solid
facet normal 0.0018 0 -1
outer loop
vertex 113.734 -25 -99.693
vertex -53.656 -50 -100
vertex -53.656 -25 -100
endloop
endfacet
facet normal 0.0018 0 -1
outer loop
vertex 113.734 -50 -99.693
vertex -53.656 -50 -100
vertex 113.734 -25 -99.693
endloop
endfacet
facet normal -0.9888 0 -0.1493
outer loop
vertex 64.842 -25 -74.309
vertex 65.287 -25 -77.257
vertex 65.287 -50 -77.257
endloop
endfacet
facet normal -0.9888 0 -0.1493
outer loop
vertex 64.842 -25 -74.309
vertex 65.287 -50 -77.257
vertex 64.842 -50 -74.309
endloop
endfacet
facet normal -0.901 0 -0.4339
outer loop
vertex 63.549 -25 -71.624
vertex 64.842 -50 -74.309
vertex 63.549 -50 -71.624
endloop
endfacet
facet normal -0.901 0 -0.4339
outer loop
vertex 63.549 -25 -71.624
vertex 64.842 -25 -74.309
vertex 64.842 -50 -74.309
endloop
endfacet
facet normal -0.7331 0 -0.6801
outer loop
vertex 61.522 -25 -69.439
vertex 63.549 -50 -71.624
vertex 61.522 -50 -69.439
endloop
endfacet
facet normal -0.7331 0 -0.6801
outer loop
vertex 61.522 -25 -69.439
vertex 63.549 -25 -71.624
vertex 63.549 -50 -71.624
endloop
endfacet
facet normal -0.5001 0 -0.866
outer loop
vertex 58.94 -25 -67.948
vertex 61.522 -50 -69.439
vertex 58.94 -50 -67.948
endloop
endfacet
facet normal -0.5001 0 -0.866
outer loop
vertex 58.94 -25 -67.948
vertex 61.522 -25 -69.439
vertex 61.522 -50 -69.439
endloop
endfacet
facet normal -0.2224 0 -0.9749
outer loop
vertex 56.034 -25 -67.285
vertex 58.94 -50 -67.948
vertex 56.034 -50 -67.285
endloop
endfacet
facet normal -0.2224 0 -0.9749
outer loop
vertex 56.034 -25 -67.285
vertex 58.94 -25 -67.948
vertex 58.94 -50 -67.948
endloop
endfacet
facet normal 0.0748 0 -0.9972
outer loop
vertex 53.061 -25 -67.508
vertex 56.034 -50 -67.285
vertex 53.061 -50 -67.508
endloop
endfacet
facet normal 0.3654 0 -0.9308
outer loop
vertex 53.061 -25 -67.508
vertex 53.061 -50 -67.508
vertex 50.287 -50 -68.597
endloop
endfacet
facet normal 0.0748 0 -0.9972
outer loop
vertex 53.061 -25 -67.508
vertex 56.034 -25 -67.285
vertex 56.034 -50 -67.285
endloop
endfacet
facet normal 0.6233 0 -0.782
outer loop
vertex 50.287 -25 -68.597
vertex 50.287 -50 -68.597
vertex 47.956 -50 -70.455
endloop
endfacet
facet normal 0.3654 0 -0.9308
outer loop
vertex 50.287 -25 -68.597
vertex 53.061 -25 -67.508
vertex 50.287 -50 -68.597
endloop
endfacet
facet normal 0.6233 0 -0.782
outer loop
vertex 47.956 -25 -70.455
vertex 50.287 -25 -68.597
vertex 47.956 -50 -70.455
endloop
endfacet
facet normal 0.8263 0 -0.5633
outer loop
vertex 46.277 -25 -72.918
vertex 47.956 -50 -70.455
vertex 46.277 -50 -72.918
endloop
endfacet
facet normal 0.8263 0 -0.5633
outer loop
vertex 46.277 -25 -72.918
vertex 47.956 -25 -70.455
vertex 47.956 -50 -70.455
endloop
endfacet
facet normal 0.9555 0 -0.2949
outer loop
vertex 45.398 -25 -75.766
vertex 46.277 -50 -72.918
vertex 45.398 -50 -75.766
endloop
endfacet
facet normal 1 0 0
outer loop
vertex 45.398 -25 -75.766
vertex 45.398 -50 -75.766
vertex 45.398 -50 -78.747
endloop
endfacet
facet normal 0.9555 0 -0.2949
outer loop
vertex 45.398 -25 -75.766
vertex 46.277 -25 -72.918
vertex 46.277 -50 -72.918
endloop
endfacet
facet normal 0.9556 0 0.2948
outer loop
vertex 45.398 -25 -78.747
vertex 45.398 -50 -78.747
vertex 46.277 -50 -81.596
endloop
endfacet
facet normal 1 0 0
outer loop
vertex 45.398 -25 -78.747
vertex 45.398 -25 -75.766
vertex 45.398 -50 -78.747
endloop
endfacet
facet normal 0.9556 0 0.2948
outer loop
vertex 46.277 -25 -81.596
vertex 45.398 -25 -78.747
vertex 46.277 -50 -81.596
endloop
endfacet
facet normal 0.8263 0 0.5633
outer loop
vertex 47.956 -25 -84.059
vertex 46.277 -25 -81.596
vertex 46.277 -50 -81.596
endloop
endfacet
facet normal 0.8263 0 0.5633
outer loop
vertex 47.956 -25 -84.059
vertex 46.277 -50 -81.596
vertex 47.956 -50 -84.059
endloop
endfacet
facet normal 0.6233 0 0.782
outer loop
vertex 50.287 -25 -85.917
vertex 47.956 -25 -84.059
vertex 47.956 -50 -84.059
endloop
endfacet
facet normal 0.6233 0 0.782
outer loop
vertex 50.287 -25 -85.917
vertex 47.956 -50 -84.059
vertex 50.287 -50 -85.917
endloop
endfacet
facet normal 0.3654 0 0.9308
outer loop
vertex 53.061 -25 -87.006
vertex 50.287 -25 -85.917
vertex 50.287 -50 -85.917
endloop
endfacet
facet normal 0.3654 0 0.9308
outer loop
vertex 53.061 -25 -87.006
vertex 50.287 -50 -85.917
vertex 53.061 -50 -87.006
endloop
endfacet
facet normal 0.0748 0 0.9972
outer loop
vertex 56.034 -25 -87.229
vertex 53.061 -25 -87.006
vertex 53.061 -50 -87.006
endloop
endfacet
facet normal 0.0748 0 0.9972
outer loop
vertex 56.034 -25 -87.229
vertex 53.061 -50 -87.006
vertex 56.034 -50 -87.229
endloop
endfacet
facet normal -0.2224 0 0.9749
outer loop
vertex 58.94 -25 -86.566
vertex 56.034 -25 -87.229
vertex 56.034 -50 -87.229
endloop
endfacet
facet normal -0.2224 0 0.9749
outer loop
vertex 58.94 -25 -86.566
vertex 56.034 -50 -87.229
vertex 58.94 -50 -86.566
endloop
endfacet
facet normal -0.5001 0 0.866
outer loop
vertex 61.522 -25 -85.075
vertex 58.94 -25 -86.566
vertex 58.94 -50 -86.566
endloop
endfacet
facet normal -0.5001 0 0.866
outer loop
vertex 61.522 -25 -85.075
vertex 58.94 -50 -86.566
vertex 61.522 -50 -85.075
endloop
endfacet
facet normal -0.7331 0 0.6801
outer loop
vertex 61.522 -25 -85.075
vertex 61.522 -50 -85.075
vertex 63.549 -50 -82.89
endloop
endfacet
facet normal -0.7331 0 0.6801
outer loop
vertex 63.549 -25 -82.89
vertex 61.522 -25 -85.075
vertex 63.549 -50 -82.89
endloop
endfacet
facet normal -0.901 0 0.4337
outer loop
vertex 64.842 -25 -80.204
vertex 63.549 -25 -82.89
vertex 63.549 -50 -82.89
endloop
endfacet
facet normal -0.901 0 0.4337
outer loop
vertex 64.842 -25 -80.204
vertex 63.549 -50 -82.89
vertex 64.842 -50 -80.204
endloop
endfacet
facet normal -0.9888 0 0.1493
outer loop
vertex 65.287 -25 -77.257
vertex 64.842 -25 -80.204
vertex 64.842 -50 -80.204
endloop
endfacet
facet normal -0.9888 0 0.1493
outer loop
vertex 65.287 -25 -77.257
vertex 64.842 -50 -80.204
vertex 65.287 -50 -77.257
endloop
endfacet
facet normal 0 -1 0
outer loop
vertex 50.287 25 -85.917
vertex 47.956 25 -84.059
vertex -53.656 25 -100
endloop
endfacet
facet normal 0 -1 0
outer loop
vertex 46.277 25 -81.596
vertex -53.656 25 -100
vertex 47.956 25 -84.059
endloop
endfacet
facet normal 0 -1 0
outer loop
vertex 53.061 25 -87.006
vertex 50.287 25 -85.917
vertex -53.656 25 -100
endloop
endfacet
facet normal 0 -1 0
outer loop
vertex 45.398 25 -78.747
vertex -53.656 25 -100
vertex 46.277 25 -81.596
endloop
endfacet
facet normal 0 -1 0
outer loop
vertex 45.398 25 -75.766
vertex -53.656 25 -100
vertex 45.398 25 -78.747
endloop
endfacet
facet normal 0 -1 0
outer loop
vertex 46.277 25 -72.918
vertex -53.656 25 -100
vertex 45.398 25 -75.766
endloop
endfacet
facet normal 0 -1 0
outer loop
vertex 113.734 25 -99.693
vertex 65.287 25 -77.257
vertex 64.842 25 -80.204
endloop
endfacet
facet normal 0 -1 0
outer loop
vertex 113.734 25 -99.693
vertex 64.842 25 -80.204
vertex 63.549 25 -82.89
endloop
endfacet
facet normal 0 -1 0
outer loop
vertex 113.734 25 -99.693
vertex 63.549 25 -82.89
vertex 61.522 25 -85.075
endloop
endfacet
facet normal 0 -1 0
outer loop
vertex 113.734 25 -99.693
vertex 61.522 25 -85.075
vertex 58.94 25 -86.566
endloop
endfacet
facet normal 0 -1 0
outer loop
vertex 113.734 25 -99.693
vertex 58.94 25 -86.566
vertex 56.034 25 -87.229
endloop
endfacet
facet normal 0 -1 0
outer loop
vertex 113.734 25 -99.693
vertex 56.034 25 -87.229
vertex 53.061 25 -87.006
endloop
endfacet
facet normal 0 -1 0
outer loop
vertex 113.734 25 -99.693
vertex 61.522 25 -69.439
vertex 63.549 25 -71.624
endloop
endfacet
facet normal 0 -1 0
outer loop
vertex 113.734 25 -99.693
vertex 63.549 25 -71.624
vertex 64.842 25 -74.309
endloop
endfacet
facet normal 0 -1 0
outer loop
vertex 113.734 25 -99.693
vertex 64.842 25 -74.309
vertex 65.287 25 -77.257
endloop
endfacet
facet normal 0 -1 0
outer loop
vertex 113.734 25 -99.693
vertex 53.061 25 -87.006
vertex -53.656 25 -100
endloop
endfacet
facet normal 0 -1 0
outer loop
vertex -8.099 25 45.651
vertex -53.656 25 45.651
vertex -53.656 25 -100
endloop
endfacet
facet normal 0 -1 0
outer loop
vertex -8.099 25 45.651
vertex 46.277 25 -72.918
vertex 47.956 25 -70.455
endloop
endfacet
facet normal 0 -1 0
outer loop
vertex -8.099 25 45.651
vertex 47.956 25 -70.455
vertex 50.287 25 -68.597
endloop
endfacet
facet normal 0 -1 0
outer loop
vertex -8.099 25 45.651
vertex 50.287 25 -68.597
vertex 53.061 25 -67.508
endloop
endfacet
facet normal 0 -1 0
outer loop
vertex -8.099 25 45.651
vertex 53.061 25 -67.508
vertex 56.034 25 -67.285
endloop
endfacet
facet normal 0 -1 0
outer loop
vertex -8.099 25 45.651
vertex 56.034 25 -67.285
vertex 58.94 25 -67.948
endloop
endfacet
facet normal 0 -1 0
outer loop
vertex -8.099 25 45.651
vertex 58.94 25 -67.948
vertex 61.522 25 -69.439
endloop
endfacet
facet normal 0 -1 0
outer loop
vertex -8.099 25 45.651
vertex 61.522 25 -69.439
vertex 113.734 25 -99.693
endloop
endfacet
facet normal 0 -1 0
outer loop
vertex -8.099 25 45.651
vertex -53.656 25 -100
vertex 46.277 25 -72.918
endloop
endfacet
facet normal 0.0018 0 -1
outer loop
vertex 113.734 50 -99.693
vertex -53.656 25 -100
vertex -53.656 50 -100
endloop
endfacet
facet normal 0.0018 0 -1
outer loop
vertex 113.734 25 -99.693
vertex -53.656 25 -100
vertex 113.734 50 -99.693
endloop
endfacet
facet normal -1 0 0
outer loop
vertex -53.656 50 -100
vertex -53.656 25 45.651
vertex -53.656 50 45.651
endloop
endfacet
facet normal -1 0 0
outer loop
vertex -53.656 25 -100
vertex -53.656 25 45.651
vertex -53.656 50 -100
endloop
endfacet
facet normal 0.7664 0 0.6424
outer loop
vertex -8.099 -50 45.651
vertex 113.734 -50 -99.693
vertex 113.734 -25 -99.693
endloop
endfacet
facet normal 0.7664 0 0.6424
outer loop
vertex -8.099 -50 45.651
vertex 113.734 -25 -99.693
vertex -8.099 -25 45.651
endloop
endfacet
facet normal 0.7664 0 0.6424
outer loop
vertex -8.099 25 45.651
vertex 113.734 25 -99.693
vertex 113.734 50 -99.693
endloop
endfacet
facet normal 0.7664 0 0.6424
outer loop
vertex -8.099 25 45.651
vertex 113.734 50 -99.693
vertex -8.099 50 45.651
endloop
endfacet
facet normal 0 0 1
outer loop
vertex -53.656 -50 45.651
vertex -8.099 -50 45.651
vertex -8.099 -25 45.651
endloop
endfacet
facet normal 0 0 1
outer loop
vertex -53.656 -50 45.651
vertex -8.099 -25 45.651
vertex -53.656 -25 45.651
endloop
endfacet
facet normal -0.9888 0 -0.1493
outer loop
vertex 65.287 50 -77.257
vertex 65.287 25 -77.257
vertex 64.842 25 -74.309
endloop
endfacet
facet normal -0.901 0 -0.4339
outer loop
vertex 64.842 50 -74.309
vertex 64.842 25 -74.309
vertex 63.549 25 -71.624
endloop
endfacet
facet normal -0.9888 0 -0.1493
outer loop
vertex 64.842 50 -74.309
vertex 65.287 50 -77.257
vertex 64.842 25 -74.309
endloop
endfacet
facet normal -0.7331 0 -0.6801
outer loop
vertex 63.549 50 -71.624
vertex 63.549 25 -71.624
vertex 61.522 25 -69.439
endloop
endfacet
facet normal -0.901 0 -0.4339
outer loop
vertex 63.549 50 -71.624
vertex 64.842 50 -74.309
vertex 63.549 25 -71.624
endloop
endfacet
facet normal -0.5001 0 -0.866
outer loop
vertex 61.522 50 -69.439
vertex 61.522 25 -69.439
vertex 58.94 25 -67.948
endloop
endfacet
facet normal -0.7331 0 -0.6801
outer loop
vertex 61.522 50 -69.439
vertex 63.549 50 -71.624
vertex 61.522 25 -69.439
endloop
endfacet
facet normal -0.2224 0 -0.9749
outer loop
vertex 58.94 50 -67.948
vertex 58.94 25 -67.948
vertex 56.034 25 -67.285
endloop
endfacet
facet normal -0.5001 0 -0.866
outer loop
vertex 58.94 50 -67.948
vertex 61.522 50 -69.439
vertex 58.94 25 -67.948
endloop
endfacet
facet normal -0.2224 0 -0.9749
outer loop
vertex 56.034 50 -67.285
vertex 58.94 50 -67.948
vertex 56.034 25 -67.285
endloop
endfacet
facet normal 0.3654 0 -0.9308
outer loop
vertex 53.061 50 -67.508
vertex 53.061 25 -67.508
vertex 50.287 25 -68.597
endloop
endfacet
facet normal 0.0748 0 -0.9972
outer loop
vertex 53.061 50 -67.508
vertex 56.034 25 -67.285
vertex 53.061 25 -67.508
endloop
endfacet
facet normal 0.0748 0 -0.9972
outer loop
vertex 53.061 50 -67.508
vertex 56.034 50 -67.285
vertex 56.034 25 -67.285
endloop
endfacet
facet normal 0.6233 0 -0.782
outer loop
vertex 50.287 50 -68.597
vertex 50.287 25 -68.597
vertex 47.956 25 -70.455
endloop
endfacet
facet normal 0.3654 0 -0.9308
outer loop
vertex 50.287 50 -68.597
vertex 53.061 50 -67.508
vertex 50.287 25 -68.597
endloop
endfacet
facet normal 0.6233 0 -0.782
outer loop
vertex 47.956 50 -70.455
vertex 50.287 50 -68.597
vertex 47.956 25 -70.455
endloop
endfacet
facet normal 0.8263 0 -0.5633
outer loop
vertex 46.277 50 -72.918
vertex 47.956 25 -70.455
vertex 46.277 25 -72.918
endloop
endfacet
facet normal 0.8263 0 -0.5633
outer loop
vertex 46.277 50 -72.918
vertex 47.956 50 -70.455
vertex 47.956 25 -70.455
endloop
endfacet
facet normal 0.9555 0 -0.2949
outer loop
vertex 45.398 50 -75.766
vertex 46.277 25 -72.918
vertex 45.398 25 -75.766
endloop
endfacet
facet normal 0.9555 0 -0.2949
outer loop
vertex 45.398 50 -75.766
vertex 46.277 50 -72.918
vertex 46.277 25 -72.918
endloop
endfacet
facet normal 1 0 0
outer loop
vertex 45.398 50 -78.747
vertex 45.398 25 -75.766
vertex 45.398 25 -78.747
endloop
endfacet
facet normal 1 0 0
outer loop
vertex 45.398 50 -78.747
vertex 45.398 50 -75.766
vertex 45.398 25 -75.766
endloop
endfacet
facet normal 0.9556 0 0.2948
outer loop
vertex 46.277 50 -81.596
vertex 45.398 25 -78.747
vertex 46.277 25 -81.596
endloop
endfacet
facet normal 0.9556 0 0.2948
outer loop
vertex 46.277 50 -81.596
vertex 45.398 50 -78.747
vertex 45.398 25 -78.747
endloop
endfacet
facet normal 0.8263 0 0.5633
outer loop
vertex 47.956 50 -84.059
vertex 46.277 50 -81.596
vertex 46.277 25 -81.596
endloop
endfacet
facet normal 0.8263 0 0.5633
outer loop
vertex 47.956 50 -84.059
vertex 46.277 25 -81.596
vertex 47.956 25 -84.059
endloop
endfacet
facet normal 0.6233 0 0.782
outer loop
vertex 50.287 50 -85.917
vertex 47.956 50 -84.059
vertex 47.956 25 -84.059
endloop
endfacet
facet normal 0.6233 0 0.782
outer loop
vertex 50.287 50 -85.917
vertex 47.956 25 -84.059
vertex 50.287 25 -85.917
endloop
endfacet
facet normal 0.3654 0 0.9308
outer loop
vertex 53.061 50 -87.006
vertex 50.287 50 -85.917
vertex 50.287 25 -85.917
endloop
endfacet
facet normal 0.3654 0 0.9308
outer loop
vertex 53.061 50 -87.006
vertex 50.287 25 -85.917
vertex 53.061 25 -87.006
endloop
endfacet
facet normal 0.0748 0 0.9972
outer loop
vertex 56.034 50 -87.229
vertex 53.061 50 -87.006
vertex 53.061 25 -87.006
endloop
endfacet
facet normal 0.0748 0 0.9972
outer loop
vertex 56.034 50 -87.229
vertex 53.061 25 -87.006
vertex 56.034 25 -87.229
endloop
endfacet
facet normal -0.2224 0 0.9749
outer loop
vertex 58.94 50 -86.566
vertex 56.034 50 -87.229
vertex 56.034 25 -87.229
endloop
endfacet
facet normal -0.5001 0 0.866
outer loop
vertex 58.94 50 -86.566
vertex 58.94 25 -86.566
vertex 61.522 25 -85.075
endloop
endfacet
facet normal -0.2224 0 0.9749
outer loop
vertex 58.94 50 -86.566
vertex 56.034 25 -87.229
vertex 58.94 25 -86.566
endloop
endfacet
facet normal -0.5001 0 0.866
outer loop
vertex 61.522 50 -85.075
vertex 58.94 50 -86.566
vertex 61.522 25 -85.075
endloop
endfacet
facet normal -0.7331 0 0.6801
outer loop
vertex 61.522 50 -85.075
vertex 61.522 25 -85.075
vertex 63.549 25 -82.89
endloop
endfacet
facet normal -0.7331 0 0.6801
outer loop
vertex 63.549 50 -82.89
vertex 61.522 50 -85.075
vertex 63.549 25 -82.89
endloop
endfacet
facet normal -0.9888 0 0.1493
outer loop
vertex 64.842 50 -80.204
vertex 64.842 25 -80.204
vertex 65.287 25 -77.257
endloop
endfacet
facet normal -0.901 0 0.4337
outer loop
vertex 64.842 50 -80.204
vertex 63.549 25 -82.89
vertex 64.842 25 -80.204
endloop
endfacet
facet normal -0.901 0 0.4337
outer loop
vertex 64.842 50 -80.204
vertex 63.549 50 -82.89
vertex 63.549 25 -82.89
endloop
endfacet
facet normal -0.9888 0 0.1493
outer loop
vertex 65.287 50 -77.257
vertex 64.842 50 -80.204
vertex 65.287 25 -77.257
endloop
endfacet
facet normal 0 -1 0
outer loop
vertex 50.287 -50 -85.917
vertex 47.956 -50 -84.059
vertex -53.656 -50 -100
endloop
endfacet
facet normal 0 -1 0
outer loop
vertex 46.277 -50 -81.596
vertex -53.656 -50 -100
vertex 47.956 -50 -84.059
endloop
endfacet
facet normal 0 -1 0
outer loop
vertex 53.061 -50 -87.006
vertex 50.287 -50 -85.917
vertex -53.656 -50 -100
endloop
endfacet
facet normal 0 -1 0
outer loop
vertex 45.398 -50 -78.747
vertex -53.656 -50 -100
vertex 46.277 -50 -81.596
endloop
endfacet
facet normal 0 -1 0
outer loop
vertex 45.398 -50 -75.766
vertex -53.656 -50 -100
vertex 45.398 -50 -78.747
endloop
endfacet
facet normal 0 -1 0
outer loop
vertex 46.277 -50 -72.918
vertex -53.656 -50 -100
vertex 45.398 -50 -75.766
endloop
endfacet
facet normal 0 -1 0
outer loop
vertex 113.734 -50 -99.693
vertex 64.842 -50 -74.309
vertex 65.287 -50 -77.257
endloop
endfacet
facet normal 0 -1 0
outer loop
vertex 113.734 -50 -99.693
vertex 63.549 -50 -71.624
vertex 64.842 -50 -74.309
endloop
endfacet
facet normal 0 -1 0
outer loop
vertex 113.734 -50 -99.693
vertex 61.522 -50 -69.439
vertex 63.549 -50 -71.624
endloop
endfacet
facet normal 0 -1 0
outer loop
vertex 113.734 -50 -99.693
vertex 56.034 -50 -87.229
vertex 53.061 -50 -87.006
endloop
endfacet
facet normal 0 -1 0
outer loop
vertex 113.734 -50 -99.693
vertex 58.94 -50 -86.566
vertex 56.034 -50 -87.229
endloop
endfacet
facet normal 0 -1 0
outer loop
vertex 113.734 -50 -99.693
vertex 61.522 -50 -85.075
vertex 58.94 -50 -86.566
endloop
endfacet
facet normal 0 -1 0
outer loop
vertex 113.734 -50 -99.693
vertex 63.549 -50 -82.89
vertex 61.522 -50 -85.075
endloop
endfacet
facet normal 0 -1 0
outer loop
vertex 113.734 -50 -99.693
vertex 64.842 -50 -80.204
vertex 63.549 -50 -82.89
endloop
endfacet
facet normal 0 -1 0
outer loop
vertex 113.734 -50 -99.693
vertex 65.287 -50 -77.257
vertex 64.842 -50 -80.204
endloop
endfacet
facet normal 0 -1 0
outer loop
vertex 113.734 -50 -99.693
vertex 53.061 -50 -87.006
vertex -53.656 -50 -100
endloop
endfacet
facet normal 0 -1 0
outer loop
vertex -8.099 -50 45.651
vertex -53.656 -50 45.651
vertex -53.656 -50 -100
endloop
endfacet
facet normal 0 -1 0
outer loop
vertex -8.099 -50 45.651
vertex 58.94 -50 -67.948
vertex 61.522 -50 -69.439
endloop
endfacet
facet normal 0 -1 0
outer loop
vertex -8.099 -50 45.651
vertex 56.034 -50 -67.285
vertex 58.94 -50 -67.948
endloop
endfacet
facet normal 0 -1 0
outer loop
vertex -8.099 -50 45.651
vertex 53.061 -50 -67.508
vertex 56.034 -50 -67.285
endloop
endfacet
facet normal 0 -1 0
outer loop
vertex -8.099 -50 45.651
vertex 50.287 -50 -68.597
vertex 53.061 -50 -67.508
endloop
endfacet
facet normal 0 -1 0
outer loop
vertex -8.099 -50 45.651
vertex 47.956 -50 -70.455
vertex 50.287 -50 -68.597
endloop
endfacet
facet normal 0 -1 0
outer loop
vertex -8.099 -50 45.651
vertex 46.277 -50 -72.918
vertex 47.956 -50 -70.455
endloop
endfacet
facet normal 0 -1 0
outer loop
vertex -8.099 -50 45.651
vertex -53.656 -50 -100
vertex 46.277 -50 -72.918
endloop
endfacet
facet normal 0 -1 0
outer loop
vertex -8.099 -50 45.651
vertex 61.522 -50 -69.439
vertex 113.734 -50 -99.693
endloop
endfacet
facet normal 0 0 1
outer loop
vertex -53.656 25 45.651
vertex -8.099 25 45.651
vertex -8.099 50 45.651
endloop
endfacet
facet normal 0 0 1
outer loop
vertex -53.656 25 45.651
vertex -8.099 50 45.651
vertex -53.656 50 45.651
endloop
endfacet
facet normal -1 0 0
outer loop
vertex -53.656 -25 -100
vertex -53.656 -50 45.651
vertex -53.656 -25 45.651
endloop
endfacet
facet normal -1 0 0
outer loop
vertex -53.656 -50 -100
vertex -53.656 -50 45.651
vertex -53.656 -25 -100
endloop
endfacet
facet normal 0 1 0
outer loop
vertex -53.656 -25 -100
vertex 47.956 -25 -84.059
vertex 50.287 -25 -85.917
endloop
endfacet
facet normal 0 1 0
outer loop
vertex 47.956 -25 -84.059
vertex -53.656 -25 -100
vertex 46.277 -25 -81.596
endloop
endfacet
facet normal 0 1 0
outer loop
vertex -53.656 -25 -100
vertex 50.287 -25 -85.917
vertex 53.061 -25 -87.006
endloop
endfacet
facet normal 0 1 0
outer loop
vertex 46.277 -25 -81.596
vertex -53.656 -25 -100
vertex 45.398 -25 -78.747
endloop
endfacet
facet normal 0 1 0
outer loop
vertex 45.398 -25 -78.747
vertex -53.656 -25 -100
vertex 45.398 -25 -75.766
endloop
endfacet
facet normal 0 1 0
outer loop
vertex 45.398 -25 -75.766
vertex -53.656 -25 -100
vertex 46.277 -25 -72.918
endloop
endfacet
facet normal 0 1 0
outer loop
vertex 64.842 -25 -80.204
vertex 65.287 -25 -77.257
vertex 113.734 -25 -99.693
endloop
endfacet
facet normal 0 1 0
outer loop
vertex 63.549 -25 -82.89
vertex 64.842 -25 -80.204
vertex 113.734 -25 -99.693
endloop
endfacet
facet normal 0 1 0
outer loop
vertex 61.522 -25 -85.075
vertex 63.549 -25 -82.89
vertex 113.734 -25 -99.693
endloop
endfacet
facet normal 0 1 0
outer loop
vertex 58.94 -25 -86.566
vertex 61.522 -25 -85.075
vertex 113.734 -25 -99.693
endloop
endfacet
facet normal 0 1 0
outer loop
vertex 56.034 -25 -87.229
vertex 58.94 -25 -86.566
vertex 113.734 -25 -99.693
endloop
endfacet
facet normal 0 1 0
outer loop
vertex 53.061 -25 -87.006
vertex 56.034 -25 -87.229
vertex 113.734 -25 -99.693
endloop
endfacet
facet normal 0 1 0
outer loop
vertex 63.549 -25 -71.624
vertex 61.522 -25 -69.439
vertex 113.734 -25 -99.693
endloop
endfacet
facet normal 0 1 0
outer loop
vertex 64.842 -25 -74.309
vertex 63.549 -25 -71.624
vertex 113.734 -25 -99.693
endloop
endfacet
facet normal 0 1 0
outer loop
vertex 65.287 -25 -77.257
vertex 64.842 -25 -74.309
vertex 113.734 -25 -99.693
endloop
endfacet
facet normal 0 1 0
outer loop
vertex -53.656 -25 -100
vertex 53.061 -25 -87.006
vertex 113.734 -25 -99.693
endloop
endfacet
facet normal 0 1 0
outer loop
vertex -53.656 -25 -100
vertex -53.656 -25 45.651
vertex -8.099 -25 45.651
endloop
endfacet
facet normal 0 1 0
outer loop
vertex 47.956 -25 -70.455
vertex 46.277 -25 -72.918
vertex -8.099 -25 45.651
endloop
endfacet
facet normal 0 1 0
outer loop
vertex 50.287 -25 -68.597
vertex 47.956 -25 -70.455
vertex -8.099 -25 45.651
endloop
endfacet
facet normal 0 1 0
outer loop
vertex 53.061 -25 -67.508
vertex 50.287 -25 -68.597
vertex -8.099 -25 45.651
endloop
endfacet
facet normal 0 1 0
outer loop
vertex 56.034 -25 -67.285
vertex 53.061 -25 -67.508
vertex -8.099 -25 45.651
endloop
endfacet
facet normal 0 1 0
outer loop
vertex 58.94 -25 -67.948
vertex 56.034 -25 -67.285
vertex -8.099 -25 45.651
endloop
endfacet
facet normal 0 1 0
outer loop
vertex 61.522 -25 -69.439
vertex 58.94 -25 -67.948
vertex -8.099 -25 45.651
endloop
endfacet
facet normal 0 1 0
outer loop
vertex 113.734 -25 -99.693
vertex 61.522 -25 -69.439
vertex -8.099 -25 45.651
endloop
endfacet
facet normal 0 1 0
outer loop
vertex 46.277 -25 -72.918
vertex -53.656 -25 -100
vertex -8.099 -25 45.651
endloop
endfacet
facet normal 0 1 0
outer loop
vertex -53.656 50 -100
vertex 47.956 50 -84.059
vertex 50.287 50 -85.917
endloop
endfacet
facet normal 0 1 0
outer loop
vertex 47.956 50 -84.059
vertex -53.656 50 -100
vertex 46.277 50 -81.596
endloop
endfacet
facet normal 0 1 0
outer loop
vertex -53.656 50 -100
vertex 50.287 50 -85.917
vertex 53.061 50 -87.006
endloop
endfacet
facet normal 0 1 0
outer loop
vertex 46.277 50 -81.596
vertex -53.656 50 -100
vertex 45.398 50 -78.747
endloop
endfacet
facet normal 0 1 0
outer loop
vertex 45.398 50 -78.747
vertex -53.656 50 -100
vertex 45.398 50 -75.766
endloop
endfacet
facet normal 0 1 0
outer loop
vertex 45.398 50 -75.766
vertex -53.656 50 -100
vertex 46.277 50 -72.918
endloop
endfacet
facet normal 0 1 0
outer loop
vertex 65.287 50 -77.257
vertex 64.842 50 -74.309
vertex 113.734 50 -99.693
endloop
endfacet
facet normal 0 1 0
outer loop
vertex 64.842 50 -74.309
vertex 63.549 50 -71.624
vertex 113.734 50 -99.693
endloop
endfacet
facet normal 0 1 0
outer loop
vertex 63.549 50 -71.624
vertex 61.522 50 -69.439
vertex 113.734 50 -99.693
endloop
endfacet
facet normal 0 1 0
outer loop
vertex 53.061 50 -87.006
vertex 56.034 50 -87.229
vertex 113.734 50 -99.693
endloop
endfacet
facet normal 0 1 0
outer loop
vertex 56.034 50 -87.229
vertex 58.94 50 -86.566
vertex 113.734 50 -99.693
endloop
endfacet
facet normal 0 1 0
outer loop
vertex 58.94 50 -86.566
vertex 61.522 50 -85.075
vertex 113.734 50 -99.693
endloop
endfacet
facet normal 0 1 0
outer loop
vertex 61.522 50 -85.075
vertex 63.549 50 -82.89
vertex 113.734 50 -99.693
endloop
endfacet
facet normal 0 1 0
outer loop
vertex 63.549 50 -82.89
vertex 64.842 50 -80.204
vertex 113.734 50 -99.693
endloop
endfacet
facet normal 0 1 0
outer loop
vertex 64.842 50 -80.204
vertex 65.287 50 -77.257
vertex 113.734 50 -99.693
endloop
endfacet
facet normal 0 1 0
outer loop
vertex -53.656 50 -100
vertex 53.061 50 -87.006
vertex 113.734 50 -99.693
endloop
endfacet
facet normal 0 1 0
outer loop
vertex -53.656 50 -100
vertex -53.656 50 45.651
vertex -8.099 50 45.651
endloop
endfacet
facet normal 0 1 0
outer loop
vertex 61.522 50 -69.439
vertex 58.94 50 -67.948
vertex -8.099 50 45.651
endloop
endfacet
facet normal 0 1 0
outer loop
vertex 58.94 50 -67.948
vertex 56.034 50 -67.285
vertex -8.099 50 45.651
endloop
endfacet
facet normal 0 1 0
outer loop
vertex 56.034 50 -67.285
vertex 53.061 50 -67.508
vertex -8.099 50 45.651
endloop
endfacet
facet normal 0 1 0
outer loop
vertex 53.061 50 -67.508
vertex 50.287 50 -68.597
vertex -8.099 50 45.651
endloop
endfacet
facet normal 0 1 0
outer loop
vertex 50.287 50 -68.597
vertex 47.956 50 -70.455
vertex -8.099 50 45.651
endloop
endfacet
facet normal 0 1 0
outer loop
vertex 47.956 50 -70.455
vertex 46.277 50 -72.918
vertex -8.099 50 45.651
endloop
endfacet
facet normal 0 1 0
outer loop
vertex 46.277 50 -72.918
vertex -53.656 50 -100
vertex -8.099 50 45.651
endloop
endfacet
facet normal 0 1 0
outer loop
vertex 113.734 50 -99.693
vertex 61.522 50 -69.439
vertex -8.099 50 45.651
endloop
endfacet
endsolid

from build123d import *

# Parameters (mm, degrees)
F0_R     = 10
F1_DEPTH = 50
F2_DEPTH = 45
F3_W     = 200
F3_H     = 50
F4_DEPTH = 200


with BuildPart() as f1:
    # F0 (on Front) → F1 (new body, symmetric)
    with BuildSketch(Plane.XZ):
        Polygon((-53.655501008, 45.6514658559), (-53.655501008, -100), (113.733805716, -99.692940712), (-8.0987406167, 45.6514658559), align=None)
        with Locations((55.2866719663, -77.2568359971)):
            Circle(F0_R, mode=Mode.SUBTRACT)
    extrude(amount=F1_DEPTH, both=True)

    # F0 (on Front) → F2 (join, symmetric)
    with BuildSketch(Plane.XZ):
        Polygon((-53.655501008, 45.6514658559), (-53.655501008, -100), (113.733805716, -99.692940712), (-8.0987406167, 45.6514658559), align=None)
        with Locations((55.2866719663, -77.2568359971)):
            Circle(F0_R, mode=Mode.SUBTRACT)
    extrude(amount=F2_DEPTH, both=True)

    # F3 (on Top) → F4 (cut, symmetric)
    with BuildSketch(Plane.XY):
        with Locations((16.5363159031, 0)):
            Rectangle(F3_W, F3_H)
    extrude(amount=F4_DEPTH, both=True, mode=Mode.SUBTRACT)


solid = f1.part
